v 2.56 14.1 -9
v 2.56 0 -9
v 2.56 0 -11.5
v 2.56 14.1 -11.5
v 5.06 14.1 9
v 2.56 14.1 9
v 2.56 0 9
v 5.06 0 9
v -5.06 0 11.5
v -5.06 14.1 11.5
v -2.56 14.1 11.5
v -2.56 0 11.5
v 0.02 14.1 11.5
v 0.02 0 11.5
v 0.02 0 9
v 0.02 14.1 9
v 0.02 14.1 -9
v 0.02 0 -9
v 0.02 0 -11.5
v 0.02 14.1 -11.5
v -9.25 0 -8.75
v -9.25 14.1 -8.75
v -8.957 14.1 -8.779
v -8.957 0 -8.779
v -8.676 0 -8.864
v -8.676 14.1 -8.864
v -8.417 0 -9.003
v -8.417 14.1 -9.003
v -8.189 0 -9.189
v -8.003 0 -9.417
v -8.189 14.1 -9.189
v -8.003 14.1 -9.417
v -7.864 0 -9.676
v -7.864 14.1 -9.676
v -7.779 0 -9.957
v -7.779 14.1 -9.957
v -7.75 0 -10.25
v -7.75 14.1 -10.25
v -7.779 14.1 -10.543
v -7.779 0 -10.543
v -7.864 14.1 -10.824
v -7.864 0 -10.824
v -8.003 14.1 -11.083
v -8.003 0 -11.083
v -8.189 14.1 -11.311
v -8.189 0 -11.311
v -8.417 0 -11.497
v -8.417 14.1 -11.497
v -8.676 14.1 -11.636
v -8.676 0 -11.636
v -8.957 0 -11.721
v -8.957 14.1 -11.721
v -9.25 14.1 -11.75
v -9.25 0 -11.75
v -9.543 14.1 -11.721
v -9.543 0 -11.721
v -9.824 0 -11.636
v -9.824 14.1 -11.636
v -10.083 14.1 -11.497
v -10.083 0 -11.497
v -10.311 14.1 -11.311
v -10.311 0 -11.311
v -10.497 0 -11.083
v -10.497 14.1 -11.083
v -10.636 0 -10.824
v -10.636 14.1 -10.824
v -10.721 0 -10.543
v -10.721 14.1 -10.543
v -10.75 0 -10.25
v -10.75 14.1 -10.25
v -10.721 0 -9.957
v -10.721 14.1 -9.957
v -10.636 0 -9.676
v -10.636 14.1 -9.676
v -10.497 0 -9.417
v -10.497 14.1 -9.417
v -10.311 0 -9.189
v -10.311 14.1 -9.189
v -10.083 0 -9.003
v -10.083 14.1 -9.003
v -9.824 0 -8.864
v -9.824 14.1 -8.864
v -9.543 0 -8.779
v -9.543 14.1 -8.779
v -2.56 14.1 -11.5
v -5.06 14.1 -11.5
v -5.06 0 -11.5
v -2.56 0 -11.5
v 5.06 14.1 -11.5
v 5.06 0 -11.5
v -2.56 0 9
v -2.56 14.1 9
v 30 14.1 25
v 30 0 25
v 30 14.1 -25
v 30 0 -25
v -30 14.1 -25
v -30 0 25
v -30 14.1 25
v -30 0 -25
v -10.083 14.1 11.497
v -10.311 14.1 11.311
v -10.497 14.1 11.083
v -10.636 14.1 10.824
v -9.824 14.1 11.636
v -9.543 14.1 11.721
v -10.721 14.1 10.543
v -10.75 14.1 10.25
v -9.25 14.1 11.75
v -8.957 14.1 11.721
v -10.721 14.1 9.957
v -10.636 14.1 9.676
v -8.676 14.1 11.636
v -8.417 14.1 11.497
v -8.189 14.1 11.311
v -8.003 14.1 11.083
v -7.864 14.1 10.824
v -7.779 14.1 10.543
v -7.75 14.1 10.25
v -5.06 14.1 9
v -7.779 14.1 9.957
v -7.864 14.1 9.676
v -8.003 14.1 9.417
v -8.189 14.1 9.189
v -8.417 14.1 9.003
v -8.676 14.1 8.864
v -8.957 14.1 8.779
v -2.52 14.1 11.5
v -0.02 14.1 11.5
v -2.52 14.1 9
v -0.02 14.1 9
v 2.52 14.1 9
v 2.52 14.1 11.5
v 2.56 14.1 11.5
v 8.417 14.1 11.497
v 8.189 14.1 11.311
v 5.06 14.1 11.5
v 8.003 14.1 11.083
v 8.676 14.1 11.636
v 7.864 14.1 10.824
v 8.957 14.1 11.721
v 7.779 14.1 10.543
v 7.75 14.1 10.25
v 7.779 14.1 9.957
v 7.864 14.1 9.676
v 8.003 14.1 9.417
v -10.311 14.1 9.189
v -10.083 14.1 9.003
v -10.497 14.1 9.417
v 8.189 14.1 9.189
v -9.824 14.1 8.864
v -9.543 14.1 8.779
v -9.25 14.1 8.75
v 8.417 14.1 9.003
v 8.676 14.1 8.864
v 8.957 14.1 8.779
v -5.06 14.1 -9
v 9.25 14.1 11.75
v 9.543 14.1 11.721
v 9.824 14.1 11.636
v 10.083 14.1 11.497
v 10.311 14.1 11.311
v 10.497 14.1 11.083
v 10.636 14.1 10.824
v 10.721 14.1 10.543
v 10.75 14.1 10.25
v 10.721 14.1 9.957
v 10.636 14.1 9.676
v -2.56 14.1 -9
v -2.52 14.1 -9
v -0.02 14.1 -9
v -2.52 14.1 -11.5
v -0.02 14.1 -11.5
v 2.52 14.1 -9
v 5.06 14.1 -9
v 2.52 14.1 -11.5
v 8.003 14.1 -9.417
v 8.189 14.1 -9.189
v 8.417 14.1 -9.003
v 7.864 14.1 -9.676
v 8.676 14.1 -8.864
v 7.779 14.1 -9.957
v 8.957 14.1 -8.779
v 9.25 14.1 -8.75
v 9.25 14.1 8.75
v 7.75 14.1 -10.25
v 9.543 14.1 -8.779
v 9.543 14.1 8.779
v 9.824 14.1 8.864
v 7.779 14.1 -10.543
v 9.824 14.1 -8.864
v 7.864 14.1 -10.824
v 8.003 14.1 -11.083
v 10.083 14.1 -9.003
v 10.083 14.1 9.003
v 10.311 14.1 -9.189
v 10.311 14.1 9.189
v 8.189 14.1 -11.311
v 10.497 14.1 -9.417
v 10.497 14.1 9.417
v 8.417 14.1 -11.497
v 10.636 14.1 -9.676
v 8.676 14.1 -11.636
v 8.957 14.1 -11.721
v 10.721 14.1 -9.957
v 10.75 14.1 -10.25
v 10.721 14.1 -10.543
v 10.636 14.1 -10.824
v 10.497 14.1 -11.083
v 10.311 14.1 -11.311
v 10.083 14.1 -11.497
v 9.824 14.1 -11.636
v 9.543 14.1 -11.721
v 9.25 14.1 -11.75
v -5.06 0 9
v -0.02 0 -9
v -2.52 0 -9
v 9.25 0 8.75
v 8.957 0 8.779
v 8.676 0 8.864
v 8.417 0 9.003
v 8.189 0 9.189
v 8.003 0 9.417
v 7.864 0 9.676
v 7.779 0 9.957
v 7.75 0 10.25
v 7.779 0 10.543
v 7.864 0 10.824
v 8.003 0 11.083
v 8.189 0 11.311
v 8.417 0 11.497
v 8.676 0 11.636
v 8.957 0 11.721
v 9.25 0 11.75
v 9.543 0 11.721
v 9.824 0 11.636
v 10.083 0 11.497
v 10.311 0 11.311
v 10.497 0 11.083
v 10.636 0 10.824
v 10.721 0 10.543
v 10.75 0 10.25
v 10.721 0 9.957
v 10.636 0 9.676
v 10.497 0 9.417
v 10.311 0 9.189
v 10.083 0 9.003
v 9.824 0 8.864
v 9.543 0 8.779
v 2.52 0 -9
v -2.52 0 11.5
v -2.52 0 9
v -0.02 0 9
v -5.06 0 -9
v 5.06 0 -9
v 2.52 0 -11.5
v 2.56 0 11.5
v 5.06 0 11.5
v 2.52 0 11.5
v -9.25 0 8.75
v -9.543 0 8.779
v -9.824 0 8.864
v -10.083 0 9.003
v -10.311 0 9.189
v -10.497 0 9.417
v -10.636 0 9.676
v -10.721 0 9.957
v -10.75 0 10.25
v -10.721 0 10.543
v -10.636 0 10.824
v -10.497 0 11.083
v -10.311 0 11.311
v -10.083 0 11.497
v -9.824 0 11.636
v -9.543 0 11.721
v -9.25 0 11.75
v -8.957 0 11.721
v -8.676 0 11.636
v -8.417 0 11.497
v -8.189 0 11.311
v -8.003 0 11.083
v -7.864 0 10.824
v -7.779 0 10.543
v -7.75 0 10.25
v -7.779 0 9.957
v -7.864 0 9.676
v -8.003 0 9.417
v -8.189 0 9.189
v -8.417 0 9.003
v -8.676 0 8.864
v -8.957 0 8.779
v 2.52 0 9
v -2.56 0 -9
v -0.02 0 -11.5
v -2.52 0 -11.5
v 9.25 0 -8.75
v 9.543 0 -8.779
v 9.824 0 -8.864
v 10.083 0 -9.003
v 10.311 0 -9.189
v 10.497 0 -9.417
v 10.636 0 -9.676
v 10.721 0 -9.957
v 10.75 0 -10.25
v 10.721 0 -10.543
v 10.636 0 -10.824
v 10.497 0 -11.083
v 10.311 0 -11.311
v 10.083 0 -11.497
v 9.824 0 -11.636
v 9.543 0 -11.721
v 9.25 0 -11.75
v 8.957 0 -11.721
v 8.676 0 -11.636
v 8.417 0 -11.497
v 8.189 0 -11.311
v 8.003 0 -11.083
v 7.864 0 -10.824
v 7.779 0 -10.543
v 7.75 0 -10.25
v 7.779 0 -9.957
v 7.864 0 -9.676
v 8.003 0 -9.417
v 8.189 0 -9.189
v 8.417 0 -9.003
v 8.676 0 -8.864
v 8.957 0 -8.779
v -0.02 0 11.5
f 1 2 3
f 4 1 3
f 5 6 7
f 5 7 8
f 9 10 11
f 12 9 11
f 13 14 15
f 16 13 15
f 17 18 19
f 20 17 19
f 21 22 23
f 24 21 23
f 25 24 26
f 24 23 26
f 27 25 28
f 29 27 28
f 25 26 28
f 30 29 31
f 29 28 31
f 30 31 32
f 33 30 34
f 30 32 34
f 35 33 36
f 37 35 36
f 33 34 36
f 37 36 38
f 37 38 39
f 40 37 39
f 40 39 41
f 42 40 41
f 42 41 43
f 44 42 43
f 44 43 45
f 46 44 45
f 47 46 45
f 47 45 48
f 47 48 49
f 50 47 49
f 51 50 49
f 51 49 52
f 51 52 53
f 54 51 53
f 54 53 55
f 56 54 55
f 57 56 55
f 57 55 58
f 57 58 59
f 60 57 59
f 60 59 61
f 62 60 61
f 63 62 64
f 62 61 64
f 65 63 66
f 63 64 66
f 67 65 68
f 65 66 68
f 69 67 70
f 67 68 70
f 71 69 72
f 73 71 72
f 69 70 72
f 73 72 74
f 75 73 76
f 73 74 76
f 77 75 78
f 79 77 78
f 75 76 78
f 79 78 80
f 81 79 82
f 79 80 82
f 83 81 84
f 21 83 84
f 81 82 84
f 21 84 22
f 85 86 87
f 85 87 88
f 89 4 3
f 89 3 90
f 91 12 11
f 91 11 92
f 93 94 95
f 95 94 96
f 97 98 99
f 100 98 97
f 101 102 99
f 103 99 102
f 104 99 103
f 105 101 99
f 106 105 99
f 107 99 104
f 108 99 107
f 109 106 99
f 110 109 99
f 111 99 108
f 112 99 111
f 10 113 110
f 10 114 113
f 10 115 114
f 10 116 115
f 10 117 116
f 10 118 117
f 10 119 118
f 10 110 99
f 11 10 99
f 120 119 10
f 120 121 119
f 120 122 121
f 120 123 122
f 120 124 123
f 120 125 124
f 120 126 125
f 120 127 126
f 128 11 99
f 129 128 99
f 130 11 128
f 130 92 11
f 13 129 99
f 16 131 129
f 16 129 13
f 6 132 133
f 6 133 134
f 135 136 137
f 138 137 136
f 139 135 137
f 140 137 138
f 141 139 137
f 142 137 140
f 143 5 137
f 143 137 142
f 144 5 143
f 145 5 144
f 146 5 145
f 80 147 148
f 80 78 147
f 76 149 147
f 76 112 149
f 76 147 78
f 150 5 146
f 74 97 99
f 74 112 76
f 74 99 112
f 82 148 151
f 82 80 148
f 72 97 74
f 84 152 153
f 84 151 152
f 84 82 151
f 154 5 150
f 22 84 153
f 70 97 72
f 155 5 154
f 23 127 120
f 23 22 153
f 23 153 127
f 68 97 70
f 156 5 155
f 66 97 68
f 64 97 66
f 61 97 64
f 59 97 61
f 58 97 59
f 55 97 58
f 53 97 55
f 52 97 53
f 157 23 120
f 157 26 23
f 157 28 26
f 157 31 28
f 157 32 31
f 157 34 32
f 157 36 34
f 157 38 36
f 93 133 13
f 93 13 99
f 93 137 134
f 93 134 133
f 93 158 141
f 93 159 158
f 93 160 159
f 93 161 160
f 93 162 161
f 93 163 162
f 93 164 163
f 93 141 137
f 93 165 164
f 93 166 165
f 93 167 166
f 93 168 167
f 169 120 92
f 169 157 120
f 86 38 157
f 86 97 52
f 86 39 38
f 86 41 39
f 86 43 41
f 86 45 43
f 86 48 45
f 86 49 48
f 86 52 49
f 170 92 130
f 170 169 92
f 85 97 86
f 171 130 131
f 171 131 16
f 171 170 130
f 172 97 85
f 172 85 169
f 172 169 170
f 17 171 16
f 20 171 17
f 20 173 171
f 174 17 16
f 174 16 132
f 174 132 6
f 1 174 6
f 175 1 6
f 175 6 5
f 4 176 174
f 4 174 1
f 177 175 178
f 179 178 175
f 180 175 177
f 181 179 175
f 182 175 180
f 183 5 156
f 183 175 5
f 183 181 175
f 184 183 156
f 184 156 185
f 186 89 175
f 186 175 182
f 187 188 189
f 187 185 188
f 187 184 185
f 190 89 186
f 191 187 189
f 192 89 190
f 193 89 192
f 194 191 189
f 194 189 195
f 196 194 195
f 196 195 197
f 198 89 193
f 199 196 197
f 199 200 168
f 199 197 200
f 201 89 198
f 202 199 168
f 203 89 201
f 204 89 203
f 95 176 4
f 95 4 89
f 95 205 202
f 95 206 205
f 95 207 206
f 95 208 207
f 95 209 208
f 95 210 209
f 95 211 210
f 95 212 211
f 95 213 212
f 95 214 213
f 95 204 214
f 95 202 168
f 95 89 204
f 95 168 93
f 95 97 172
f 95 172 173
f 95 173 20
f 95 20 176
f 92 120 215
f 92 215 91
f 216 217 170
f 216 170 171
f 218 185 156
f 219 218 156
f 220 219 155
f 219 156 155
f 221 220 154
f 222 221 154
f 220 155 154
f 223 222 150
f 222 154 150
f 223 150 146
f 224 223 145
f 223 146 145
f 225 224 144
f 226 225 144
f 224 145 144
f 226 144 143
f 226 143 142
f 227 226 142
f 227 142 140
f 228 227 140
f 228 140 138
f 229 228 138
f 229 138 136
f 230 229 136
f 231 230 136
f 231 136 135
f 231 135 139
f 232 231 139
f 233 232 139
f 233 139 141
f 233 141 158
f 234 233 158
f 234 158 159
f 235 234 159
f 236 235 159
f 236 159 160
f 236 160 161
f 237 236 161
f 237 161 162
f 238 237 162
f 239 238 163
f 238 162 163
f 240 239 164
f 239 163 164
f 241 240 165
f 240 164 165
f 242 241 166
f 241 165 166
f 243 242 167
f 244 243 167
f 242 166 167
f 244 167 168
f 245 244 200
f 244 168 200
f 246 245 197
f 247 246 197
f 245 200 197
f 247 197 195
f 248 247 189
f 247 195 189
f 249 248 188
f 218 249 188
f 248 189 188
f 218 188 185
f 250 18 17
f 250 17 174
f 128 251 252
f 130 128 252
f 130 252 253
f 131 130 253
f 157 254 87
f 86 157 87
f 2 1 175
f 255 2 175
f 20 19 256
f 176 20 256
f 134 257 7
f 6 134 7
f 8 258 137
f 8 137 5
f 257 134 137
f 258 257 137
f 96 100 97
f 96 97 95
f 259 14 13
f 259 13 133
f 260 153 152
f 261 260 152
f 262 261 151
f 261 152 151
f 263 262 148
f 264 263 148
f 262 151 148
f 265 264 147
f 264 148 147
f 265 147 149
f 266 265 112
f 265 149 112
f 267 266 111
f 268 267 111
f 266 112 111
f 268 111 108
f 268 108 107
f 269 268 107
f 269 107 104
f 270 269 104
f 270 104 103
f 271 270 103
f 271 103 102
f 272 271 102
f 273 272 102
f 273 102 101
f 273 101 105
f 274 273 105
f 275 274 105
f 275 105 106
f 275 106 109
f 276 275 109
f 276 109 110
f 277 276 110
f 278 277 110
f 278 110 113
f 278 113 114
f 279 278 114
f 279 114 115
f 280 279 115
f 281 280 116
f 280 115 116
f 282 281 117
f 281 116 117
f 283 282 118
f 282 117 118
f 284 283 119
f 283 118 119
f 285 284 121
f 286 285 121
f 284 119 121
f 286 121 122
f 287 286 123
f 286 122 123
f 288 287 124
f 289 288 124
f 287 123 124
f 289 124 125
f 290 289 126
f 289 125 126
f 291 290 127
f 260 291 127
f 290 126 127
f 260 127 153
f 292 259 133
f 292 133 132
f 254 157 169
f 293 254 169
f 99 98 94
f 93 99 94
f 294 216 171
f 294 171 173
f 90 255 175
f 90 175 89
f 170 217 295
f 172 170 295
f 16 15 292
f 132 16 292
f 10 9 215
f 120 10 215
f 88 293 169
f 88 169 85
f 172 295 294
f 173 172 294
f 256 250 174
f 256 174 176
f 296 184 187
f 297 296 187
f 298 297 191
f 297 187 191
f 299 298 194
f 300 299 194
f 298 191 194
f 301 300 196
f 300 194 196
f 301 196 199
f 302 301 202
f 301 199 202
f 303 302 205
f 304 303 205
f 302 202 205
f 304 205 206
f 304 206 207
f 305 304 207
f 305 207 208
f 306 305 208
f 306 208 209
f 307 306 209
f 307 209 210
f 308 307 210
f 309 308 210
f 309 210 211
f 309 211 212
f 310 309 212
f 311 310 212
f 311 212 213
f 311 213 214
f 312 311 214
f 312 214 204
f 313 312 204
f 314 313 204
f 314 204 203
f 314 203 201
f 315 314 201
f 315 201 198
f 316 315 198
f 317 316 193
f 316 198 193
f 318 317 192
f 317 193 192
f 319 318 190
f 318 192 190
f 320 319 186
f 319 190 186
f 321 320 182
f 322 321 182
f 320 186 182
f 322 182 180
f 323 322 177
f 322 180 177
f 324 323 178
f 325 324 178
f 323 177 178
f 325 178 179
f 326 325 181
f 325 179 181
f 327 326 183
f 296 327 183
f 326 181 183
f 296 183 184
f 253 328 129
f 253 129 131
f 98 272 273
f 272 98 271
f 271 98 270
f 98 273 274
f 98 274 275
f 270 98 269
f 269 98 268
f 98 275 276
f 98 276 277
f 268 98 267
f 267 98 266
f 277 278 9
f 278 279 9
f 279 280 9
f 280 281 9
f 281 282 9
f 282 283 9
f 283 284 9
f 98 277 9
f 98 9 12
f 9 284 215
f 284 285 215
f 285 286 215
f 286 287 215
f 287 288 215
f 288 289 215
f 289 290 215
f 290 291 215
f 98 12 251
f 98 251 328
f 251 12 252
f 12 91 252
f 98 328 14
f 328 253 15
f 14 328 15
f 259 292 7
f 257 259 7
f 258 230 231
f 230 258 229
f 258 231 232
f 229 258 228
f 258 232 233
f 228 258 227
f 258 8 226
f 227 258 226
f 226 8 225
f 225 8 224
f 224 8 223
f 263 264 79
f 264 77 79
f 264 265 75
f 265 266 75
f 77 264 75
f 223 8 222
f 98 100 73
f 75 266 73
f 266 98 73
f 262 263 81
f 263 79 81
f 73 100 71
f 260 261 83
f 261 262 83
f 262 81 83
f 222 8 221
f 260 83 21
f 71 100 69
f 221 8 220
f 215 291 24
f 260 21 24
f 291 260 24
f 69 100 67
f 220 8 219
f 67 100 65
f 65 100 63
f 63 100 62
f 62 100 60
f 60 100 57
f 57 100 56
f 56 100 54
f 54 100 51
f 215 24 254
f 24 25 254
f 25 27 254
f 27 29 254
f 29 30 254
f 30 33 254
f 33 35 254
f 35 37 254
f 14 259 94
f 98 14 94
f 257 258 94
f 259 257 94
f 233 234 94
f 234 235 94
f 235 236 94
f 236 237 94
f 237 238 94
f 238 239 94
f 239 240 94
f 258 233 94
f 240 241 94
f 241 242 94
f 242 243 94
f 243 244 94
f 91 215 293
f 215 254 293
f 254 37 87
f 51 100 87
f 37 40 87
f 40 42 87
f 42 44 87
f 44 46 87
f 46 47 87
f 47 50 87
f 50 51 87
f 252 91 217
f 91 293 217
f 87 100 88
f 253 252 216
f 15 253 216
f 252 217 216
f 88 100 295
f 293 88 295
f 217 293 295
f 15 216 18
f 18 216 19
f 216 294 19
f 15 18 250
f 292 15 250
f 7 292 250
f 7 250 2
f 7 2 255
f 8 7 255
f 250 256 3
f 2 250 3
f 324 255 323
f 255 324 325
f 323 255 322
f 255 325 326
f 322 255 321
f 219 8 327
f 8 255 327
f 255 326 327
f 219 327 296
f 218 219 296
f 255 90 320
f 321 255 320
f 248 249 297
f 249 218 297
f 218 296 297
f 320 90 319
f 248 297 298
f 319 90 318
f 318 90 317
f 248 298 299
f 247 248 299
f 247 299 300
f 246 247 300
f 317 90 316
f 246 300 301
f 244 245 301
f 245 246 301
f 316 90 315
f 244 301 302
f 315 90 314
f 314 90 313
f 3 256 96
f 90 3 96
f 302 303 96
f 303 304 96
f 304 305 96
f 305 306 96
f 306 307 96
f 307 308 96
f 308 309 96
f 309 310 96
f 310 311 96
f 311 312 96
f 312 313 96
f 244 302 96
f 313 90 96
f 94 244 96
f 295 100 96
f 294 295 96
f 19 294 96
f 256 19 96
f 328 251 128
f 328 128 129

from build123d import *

# Parameters (mm, degrees)
ESQUISSE1_W             = 60
ESQUISSE1_H             = 50
BOSS_EXTRU_2_DEPTH      = 14.1
ESQUISSE2_R             = 1.5
ESQUISSE2_W             = 2.5
ESQUISSE2_H             = 2.5
ENL_V_MAT_EXTRU_1_DEPTH = 42.518790927


with BuildPart() as part:
    # Esquisse1 → Boss.-Extru.2 (new body)
    with BuildSketch(Plane(origin=(0, 0, 0), x_dir=(1, 0, 0), z_dir=(0, 1, 0))):
        Rectangle(ESQUISSE1_W, ESQUISSE1_H)
    extrude(amount=BOSS_EXTRU_2_DEPTH)

    # Esquisse2 → Enlèv. mat.-Extru.1 (cut, through all)
    with BuildSketch(Plane(origin=(0, 14.1, 0), x_dir=(1, 0, 0), z_dir=(0, 1, 0))):
        with Locations(Location((-9.25, 10.25, 0), (0, 0, 270))):
            Circle(ESQUISSE2_R)
        with Locations(Location((9.25, 10.25, 0), (0, 0, 270))):
            Circle(ESQUISSE2_R)
        with Locations(Location((9.25, -10.25, 0), (0, 0, 90))):
            Circle(ESQUISSE2_R)
        with Locations(Location((-9.25, -10.25, 0), (0, 0, 90))):
            Circle(ESQUISSE2_R)
        with Locations((3.81, -10.25)):
            Rectangle(ESQUISSE2_W, ESQUISSE2_H)
        with Locations((-3.81, 10.25)):
            Rectangle(ESQUISSE2_W, ESQUISSE2_H)
        with Locations((1.27, -10.25)):
            Rectangle(ESQUISSE2_W, ESQUISSE2_H)
        with Locations((-1.27, 10.25)):
            Rectangle(ESQUISSE2_W, ESQUISSE2_H)
        with Locations((1.27, 10.25)):
            Rectangle(ESQUISSE2_W, ESQUISSE2_H)
        with Locations((3.81, 10.25)):
            Rectangle(ESQUISSE2_W, ESQUISSE2_H)
        with Locations((-1.27, -10.25)):
            Rectangle(ESQUISSE2_W, ESQUISSE2_H)
        with Locations((-3.81, -10.25)):
            Rectangle(ESQUISSE2_W, ESQUISSE2_H)
    extrude(amount=-ENL_V_MAT_EXTRU_1_DEPTH, mode=Mode.SUBTRACT)


solid = part.part
